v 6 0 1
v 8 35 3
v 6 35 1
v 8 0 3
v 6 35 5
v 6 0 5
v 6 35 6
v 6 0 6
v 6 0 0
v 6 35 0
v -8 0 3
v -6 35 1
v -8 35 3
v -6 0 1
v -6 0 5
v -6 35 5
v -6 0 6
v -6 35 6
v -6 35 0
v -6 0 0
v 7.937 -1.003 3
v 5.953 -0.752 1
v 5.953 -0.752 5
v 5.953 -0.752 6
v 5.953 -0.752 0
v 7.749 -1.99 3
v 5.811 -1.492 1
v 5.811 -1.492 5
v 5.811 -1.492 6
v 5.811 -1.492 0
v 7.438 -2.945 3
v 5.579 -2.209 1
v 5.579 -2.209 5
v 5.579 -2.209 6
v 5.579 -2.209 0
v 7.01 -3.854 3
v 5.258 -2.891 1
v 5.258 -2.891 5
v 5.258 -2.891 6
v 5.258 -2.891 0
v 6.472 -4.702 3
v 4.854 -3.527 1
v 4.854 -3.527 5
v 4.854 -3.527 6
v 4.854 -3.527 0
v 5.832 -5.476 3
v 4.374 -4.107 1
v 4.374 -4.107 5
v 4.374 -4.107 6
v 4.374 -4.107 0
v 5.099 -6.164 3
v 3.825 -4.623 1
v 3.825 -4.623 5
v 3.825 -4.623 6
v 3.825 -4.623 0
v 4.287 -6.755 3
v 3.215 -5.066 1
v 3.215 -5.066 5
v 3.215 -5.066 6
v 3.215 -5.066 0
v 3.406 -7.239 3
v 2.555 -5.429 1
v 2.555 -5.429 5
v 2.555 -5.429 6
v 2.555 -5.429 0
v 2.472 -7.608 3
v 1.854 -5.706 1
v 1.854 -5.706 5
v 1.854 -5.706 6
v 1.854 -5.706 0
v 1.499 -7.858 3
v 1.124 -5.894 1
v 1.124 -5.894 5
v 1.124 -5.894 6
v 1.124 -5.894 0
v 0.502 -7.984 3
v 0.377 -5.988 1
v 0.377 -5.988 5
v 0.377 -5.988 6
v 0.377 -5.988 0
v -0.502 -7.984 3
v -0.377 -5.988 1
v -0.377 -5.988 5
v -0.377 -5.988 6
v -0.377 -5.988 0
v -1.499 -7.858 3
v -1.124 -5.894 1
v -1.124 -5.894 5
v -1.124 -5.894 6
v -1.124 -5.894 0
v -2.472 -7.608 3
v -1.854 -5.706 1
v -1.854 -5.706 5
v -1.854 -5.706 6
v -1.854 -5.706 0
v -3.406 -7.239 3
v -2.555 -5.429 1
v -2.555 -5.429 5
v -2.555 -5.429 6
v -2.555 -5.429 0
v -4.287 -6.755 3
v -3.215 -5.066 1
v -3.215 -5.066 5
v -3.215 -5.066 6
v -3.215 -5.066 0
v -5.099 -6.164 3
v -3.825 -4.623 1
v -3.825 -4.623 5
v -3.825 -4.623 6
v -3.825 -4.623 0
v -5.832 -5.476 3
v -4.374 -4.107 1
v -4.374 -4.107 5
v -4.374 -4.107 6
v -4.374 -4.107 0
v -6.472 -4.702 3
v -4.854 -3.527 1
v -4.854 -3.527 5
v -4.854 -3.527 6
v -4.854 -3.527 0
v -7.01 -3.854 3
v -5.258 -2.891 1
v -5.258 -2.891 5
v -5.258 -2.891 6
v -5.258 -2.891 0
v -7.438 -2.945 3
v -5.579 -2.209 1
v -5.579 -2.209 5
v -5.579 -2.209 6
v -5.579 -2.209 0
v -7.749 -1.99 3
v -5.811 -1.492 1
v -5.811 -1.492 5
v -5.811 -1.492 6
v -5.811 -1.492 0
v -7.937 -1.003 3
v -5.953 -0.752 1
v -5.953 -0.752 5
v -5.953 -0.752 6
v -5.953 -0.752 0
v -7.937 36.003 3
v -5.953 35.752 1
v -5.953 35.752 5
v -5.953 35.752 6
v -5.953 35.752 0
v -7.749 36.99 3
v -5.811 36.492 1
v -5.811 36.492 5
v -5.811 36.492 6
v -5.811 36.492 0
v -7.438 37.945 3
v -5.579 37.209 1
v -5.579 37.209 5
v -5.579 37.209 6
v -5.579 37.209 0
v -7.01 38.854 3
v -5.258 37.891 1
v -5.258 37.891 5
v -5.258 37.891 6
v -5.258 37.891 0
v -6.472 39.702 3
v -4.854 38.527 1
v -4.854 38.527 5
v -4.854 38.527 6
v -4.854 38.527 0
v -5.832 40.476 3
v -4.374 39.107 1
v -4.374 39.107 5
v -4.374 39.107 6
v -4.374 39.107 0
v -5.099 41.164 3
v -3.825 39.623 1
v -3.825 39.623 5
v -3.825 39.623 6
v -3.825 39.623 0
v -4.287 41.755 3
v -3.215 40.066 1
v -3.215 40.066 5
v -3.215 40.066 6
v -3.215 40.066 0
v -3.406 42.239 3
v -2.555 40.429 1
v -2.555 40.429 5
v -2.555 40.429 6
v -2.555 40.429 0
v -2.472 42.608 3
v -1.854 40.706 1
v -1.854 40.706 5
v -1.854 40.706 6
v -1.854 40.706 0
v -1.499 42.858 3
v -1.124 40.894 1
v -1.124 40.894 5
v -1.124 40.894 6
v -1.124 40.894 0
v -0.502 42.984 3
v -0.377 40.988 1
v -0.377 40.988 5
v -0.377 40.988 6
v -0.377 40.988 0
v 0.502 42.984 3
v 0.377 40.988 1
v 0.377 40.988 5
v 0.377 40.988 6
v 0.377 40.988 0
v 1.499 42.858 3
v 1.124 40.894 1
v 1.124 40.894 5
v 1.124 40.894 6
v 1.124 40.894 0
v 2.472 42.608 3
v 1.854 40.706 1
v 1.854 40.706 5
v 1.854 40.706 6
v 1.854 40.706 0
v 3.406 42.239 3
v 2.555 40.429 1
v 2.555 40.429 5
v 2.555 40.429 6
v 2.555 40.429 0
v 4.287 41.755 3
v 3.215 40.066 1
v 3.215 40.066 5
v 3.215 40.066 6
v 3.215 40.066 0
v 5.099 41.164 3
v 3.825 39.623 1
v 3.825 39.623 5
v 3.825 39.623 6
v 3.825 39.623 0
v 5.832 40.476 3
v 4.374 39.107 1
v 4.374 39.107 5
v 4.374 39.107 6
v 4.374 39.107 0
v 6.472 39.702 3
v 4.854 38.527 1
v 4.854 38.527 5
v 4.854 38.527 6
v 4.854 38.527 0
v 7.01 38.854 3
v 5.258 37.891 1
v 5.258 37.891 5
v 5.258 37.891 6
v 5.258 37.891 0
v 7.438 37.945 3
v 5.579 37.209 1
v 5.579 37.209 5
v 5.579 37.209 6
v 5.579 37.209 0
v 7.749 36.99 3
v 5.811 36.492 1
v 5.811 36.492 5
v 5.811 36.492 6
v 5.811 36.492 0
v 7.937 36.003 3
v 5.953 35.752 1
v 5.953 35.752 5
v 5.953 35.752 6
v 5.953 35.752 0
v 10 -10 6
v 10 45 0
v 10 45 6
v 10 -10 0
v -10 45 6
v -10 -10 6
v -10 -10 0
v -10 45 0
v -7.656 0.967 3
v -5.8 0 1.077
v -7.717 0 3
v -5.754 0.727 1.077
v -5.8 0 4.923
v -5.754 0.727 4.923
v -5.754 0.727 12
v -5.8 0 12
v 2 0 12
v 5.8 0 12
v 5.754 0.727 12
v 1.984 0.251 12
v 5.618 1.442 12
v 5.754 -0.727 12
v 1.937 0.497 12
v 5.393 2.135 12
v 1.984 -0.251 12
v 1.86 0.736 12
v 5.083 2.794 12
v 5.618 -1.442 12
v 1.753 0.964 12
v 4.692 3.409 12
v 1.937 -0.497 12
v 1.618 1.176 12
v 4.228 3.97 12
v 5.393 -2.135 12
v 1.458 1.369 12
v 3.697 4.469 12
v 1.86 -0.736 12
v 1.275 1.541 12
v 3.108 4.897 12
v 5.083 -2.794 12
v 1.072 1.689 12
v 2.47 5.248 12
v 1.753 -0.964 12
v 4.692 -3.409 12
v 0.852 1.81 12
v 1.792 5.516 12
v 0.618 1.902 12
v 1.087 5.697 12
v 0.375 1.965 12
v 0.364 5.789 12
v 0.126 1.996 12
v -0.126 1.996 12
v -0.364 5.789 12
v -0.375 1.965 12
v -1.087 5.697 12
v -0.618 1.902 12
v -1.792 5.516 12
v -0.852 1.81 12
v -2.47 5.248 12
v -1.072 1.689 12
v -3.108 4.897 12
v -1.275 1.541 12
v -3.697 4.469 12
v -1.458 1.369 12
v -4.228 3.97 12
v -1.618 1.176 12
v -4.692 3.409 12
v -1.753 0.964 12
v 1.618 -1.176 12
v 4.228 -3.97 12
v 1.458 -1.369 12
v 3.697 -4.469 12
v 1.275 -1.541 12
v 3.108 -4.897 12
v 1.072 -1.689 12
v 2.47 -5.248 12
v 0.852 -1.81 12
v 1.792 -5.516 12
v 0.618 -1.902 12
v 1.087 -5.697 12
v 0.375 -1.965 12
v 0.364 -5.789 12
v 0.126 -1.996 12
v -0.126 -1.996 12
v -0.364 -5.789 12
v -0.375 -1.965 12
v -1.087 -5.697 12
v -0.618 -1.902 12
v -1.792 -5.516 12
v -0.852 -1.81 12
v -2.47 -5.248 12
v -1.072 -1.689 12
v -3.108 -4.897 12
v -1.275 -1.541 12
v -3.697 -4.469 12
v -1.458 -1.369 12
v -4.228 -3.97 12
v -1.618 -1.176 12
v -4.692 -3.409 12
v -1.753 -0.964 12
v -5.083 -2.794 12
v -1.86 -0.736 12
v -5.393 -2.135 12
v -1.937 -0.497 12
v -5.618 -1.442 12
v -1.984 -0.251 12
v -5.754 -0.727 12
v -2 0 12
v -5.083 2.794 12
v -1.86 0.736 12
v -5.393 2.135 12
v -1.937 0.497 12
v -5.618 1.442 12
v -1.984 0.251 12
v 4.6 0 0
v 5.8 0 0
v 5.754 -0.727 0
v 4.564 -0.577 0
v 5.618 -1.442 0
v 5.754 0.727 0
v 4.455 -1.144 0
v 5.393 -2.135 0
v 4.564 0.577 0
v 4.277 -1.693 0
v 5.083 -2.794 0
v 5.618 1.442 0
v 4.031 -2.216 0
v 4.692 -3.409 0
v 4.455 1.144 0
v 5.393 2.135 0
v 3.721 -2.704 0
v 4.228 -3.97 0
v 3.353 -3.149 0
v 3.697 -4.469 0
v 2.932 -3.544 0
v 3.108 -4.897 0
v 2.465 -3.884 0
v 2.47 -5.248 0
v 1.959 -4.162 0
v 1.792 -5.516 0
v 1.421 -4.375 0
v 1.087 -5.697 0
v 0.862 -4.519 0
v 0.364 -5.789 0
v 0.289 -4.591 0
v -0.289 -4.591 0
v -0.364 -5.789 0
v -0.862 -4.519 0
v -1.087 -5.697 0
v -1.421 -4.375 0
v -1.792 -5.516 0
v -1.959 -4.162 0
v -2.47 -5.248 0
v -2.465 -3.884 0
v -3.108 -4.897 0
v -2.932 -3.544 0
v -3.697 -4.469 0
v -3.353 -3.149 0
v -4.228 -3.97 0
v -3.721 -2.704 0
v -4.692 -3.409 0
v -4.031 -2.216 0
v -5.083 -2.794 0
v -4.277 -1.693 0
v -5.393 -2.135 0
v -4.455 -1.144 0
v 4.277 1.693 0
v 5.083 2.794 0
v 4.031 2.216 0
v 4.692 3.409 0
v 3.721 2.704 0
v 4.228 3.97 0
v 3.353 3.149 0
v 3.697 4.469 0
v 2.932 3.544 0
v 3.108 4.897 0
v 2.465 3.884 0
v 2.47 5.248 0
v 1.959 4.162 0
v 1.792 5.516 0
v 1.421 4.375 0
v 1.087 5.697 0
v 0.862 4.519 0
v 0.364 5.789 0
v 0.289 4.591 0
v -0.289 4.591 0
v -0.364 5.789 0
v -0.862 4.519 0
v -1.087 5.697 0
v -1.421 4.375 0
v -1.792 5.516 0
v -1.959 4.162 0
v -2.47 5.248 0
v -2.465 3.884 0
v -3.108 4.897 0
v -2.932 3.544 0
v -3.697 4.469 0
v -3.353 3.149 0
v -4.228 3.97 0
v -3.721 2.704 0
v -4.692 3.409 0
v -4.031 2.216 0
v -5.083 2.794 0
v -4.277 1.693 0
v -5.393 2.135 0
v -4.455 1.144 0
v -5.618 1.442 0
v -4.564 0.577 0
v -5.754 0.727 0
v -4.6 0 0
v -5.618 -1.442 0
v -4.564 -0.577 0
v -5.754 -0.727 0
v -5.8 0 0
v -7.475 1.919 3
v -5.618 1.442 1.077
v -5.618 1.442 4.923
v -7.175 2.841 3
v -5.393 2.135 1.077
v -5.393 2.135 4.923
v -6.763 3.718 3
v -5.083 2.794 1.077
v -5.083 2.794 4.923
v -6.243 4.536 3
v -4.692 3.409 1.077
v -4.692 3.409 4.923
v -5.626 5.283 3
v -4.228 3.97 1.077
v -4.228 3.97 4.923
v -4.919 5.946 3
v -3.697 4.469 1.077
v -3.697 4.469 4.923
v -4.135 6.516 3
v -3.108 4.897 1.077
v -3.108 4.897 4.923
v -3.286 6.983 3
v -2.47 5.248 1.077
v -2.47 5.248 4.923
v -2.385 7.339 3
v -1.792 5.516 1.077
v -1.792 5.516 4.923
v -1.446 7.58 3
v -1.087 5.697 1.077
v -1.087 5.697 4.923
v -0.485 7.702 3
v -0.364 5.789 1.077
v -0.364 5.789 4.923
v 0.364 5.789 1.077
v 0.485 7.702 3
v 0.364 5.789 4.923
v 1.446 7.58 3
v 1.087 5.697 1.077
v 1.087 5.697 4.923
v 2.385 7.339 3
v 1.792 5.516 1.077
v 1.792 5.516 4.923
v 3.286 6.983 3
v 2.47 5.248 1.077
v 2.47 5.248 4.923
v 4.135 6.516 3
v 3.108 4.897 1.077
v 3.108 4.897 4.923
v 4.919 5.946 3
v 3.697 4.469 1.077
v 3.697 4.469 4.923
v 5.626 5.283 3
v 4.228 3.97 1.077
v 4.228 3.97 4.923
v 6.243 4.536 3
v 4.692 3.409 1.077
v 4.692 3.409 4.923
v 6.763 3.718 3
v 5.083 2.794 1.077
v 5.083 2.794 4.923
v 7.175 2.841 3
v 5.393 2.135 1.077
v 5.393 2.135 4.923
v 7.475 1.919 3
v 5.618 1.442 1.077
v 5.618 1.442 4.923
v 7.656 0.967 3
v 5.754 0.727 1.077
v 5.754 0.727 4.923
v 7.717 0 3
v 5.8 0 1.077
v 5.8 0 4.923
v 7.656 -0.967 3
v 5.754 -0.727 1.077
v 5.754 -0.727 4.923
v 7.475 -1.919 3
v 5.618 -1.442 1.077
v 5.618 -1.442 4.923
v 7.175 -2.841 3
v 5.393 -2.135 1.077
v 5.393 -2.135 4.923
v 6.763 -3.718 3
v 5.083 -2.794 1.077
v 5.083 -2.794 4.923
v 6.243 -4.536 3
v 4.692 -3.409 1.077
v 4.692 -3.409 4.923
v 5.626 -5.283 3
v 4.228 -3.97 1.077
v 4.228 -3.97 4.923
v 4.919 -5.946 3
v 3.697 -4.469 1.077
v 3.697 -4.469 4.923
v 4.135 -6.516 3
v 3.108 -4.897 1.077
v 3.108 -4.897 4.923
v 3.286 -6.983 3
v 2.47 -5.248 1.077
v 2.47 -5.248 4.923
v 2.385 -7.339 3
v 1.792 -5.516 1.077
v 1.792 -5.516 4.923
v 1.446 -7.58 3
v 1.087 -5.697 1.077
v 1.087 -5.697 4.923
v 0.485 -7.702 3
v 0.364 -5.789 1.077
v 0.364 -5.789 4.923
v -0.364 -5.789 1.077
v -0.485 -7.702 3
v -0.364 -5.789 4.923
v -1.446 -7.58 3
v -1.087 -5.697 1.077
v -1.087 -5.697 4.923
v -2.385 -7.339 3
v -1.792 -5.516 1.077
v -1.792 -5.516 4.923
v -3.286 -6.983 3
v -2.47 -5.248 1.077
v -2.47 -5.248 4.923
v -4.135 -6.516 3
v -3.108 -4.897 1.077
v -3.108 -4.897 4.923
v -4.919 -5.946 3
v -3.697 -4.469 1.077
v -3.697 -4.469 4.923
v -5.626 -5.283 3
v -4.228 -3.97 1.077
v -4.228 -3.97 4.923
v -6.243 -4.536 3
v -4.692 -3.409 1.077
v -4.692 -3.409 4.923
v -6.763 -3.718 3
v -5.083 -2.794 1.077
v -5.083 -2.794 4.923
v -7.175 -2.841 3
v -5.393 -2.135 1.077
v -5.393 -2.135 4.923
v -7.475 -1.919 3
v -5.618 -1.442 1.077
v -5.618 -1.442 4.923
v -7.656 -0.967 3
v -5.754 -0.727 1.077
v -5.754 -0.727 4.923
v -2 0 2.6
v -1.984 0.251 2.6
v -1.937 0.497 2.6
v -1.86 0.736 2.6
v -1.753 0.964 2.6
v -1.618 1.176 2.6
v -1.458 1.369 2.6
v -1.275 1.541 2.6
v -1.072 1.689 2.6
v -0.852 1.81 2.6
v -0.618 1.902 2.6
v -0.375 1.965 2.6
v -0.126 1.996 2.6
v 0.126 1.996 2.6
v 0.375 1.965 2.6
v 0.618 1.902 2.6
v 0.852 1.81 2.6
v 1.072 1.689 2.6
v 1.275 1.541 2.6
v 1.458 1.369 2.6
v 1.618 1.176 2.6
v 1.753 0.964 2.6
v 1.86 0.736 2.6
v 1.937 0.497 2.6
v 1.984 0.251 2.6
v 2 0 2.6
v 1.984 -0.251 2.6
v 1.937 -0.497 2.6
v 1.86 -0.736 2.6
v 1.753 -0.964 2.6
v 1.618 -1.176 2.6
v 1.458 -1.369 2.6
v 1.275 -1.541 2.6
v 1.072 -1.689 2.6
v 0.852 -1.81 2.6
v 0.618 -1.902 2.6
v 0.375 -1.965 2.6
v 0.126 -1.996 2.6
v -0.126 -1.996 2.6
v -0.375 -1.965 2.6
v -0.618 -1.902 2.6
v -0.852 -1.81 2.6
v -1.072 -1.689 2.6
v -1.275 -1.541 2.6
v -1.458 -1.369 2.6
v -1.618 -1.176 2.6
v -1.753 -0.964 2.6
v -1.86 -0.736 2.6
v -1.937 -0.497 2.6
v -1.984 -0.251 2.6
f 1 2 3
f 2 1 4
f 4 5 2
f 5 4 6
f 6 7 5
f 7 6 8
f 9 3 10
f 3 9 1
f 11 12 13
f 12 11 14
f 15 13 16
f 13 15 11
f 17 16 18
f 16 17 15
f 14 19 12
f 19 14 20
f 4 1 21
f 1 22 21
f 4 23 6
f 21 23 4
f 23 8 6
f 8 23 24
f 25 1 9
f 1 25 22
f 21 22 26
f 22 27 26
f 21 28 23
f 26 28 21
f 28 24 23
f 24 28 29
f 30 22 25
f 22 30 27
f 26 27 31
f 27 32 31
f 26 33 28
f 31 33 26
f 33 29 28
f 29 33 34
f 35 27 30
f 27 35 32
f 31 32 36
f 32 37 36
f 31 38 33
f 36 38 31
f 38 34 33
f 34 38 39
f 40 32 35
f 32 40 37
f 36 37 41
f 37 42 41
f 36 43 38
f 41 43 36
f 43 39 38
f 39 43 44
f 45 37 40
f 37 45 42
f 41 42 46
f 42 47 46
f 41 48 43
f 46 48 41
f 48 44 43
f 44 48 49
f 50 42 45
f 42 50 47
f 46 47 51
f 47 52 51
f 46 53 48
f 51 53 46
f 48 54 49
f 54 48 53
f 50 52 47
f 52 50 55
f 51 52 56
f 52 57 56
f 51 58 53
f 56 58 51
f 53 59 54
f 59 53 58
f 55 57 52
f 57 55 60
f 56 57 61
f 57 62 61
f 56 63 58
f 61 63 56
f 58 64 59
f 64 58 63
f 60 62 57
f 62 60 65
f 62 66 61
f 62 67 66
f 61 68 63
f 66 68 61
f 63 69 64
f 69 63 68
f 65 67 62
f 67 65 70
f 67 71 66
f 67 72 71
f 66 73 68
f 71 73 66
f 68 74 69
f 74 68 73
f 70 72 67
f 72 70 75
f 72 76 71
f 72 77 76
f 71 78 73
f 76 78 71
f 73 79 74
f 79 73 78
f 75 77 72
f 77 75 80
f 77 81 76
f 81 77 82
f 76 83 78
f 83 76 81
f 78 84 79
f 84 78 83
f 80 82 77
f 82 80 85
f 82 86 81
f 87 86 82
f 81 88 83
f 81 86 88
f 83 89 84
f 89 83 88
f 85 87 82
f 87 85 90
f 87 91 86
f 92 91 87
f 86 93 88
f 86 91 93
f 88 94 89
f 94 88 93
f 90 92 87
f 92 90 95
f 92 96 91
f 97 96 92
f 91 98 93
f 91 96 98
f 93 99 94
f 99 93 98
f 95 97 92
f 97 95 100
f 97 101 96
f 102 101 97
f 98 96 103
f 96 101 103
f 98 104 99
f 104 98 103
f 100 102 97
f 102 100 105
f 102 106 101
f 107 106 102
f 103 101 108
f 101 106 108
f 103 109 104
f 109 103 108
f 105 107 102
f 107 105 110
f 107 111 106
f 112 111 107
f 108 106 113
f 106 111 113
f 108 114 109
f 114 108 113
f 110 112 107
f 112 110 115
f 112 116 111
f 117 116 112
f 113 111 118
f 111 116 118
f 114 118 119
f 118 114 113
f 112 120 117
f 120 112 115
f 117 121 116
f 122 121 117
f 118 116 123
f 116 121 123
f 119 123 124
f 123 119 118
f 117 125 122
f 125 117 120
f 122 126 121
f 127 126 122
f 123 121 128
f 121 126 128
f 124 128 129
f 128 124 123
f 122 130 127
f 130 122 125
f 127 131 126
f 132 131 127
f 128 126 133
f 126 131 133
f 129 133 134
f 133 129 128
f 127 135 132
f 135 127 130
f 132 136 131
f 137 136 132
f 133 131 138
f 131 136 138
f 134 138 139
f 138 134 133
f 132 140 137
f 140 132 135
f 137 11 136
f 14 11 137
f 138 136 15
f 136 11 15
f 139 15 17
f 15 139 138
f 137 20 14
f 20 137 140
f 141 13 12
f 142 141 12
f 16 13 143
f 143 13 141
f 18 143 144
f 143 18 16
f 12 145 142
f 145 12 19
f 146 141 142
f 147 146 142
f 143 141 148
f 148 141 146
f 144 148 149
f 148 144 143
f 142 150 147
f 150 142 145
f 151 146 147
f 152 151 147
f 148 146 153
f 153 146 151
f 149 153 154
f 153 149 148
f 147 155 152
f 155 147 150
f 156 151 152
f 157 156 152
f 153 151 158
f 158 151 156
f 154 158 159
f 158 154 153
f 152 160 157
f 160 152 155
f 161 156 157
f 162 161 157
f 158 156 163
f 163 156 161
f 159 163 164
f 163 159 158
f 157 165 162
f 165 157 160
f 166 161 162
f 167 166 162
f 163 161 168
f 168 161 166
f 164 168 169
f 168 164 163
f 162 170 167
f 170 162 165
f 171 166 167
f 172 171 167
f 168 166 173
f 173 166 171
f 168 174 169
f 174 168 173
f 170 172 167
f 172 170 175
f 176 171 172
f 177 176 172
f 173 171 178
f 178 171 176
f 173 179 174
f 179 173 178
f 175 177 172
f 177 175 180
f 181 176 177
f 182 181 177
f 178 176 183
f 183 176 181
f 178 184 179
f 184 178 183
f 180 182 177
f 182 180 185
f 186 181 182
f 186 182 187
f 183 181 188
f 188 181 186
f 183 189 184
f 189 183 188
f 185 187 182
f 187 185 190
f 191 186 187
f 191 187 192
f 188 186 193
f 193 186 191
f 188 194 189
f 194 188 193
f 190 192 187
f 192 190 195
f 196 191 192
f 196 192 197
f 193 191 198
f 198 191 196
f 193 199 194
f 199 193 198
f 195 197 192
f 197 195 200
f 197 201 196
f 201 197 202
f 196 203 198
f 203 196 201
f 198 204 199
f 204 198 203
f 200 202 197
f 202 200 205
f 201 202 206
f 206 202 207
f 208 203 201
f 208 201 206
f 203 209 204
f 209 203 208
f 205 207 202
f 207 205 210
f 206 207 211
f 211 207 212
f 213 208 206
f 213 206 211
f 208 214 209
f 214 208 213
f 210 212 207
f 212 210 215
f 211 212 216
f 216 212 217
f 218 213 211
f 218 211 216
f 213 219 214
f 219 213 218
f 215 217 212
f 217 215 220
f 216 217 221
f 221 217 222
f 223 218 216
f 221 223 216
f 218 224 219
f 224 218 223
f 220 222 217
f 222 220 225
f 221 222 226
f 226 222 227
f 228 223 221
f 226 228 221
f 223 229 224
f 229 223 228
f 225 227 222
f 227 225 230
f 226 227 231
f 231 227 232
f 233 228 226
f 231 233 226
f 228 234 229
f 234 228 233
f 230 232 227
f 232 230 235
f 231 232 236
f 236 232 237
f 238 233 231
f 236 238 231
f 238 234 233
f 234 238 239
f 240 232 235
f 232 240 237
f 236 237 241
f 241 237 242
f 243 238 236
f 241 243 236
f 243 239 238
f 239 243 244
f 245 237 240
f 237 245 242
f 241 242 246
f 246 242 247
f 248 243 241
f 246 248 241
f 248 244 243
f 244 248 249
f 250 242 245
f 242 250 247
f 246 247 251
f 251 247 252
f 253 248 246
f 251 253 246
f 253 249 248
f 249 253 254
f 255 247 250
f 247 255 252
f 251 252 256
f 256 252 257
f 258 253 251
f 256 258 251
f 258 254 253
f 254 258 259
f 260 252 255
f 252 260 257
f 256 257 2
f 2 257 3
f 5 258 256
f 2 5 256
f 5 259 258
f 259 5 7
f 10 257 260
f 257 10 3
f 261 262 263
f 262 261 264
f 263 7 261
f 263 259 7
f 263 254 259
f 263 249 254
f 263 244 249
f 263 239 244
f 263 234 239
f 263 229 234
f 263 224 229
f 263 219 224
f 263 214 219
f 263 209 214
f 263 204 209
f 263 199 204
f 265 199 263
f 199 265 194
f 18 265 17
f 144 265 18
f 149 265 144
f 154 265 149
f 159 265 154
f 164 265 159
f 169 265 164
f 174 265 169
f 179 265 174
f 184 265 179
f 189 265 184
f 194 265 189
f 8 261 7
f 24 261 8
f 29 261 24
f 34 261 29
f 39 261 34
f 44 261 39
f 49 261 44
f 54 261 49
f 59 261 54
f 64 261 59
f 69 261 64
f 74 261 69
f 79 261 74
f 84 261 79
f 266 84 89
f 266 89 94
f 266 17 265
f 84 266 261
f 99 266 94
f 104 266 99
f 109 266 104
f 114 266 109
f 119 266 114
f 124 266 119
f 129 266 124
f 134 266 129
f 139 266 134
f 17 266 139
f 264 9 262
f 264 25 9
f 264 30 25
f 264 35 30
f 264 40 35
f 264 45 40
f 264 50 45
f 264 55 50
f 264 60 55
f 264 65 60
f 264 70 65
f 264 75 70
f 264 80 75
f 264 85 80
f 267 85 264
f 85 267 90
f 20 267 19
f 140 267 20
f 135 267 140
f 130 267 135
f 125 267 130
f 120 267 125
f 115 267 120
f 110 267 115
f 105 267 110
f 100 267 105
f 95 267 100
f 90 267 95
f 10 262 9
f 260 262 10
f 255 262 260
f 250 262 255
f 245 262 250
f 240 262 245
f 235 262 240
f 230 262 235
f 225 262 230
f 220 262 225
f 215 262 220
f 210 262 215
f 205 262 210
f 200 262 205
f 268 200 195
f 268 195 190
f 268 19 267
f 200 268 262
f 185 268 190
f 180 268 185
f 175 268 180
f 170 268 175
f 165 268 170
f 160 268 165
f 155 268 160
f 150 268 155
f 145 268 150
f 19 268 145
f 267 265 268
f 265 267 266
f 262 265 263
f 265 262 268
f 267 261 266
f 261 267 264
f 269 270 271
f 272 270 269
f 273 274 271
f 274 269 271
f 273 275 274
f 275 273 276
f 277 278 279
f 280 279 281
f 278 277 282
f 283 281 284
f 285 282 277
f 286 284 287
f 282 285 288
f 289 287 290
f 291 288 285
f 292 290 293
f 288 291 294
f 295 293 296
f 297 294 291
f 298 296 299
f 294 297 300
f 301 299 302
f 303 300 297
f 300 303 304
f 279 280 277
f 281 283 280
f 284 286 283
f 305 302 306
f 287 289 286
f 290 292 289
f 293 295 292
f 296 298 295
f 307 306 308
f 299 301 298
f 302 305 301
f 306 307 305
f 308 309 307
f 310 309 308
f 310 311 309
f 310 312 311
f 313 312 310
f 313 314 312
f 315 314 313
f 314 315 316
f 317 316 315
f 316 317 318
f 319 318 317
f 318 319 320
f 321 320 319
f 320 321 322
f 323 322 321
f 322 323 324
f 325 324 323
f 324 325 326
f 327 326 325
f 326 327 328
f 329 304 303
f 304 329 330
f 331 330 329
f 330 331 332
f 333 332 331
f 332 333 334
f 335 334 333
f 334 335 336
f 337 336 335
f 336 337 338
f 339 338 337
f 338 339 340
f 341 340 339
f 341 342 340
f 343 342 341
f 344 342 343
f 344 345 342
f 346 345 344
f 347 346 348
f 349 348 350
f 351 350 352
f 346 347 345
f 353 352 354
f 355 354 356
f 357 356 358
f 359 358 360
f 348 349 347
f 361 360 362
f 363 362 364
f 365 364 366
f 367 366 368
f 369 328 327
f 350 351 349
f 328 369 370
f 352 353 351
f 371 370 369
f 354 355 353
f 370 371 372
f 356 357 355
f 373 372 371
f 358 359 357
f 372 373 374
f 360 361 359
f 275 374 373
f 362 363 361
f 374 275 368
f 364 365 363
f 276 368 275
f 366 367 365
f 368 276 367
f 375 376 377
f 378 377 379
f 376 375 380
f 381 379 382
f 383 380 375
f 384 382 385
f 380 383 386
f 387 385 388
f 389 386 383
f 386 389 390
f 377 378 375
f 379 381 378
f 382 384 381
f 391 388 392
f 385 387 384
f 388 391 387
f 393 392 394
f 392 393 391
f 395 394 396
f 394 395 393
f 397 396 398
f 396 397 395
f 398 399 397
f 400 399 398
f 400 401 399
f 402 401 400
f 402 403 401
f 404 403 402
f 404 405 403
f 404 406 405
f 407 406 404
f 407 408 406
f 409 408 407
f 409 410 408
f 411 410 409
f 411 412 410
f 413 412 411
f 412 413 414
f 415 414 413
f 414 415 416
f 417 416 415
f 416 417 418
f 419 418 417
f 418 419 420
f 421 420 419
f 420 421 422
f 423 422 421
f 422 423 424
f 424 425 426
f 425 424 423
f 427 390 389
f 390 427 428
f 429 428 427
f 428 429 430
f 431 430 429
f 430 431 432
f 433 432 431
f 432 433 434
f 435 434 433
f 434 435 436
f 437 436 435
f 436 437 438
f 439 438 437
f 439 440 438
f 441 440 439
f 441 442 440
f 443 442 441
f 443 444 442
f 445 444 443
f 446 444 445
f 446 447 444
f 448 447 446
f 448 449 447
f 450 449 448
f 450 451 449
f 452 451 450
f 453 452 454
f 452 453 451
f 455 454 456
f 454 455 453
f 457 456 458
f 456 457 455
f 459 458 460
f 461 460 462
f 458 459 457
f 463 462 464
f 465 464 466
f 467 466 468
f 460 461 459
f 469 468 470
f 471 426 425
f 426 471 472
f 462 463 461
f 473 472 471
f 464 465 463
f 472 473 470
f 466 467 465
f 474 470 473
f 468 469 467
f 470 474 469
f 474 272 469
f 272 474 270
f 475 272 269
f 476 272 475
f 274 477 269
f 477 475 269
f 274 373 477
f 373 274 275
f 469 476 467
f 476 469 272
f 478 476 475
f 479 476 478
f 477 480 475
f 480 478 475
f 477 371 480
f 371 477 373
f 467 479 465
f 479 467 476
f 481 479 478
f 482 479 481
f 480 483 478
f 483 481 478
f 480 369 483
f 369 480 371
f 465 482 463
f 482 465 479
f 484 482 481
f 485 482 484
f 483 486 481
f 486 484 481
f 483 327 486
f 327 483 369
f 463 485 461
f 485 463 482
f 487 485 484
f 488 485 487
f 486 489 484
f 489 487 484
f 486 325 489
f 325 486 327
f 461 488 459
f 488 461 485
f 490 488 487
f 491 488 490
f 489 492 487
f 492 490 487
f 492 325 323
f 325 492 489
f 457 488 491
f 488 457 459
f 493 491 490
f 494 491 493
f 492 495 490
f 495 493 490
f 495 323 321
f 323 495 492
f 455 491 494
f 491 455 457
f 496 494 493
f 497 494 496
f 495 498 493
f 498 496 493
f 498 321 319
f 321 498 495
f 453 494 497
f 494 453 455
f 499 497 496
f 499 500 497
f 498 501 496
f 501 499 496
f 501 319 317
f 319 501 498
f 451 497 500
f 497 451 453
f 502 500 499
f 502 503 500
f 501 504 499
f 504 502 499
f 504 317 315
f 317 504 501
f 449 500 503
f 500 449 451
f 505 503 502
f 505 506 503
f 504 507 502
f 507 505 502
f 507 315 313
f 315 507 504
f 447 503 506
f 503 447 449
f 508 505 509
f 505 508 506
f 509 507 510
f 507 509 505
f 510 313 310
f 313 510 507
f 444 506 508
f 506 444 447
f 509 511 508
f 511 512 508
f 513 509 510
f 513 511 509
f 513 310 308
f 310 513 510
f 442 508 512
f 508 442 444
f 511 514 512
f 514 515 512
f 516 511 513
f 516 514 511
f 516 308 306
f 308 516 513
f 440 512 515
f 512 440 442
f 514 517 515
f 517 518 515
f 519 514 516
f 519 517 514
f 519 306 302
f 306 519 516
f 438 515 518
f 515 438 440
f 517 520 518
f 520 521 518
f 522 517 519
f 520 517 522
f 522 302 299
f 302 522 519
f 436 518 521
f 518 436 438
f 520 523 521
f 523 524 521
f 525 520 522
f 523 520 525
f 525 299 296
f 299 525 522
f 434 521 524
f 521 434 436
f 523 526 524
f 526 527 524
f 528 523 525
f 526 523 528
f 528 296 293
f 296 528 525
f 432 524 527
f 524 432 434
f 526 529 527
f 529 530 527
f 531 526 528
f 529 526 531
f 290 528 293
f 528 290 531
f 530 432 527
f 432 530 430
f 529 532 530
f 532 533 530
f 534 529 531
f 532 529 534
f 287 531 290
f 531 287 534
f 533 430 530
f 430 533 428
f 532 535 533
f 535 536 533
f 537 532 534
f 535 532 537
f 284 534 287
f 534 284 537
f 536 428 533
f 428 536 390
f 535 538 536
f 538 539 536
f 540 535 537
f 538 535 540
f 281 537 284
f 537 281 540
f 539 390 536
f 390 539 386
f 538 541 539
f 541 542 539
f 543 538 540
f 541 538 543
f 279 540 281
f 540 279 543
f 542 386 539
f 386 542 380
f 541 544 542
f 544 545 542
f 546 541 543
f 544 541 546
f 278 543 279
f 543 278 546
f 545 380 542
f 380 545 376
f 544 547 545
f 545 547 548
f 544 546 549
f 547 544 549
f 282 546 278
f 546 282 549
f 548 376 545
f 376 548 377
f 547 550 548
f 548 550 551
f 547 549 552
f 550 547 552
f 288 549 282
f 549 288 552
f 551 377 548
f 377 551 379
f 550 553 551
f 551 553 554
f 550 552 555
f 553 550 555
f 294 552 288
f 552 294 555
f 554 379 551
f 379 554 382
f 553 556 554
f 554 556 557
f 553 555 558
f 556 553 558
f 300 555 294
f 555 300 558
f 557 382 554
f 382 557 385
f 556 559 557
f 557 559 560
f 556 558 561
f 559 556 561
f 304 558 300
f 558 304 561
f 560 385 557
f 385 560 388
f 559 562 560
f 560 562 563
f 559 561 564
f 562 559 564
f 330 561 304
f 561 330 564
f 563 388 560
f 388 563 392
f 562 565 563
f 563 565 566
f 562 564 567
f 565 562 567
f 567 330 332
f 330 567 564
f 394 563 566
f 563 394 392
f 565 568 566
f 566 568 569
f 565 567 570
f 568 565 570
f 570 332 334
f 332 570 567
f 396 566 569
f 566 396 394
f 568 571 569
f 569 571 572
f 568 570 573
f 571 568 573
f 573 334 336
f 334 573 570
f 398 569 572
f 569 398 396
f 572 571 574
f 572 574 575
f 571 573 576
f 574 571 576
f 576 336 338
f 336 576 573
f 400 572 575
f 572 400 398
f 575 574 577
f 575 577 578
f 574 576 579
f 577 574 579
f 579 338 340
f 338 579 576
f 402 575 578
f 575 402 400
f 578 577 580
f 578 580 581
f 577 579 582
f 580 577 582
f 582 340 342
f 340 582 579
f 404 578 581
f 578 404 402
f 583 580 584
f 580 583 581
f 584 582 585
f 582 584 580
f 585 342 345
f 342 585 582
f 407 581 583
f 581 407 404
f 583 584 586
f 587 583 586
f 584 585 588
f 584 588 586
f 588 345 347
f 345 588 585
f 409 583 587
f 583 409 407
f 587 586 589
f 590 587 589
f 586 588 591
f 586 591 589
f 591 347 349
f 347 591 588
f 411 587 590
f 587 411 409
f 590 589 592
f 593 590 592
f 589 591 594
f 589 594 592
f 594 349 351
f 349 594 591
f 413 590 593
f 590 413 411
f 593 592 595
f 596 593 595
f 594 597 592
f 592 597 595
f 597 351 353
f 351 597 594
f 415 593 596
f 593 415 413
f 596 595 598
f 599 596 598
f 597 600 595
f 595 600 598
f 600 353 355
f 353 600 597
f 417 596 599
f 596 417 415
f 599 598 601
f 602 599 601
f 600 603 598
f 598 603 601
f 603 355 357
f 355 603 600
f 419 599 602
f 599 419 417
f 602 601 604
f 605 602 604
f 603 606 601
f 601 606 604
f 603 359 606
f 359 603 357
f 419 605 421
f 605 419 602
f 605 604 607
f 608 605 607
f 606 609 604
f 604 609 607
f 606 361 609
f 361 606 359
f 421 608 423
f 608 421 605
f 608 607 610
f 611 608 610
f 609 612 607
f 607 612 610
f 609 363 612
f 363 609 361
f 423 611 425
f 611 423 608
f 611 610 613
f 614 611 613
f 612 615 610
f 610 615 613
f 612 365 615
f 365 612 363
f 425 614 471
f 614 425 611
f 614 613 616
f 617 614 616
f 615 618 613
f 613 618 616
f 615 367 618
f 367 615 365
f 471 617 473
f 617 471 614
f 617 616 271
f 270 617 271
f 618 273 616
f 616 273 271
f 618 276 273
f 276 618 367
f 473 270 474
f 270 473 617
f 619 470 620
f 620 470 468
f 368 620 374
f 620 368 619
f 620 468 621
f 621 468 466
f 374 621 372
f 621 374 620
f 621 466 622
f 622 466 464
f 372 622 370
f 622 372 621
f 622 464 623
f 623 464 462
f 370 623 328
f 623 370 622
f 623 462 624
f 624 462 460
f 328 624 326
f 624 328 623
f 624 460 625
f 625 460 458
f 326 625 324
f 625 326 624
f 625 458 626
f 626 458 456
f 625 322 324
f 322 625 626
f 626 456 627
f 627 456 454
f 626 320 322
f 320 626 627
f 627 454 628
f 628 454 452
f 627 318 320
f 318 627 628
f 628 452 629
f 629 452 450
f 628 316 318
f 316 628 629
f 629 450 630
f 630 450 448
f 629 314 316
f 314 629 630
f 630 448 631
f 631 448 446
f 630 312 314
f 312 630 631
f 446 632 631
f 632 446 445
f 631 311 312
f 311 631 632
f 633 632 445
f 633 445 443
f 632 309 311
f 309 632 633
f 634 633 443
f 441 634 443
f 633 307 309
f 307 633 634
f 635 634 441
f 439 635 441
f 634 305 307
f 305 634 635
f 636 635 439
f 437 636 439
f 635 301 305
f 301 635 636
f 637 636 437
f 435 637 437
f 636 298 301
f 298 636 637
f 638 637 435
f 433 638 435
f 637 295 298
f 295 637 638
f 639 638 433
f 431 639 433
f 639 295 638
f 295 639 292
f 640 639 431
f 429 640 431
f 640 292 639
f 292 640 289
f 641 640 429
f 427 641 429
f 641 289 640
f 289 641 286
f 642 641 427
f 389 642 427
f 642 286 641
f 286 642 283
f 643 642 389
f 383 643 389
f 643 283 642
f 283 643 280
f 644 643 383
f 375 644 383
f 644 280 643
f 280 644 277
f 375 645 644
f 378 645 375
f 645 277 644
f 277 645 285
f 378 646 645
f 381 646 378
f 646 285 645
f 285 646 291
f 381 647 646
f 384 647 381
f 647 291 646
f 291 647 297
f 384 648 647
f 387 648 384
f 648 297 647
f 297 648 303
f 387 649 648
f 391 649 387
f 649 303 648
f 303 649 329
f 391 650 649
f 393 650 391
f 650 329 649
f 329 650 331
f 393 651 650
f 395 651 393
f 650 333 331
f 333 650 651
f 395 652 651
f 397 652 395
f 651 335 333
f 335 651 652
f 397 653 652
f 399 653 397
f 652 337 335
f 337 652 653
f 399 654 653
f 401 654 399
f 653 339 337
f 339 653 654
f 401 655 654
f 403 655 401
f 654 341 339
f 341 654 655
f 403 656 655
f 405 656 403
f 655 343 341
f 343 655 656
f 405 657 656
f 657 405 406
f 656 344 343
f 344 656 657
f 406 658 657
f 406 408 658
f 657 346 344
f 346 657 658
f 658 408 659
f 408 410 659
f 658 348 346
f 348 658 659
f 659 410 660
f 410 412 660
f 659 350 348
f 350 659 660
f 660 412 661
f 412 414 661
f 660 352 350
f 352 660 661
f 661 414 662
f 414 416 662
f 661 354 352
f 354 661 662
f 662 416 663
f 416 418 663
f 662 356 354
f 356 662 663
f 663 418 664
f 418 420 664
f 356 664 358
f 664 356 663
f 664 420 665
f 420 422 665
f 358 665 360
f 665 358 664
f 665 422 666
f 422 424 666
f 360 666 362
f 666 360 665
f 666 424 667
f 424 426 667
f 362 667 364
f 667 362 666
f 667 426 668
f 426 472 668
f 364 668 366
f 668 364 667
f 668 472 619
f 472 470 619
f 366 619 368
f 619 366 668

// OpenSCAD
/*
Sliding Bolt
https://github.com/danmarshall/openscad-sliding-bolt
License: Apache 2.0
*/

module slidingbolt(travel, radius, height, lip, clearance, bolt_radius, flathead_radius, standoff, action) {
	$fn = 50;
	h2 = height / 2;
	h2l = h2 - lip;
	o = radius + h2 + 1;

	function flathead() = [
		[0, -1],
		[bolt_radius + flathead_radius, -1],
		[bolt_radius + flathead_radius, 0],
		[bolt_radius, flathead_radius],
		[bolt_radius, height + standoff + 1],
		[0, height + standoff + 1],
	];

	function profile(use_clearance, use_overlap, standoff) = [
		[0, -use_overlap], 
		[radius - use_clearance, -use_overlap], 
		[radius - use_clearance, lip + sin(22.5) * use_clearance],
		[radius + h2l - use_clearance * sqrt(2), h2],
		[radius - use_clearance, height - lip - sin(22.5) * use_clearance],
		[radius - use_clearance, height + use_overlap + standoff],
		[0, height + use_overlap + standoff]
	];

	module track() {
		module halftrack() {
			translate([0, travel, 0]){
				rotate([90, 0, 0]) {
					linear_extrude(height = travel) {
						polygon(points=profile(0, 1, 0));
					}
				}
			}
		}

		halftrack();
		mirror([1, 0, 0]) {
			halftrack();
		}
		rotate_extrude(height = height) {
			polygon(points=profile(0, 1, 0));
		}
		translate([0, travel, 0]) {
			rotate_extrude(height = height) {
				polygon(points=profile(0, 1, 0));
			}
		}
	}

	module sliderbolt() {
		difference() {
			rotate_extrude(height = height) {
				polygon(points=profile(clearance, 0, standoff));
			}
			rotate_extrude(height = height) {
				polygon(points=flathead());
			}
		}
	}

	if (action == "bolt") {
		sliderbolt();
	} else if (action == "track") {
		track();
	} else {
		difference() {
			translate([-o, -o, 0]) {
				cube([2 * o, 2 * o + travel, height]);
			}
			track();
		}

		sliderbolt();
	}
}

travel = 35;
radius = 6;
height = 6;
lip = 1;
bolt_radius = 2;
flathead_radius = 2.6;
clearance = 0.2;
standoff = 6;

slidingbolt(travel, radius, height, lip, clearance, bolt_radius, flathead_radius, standoff);
